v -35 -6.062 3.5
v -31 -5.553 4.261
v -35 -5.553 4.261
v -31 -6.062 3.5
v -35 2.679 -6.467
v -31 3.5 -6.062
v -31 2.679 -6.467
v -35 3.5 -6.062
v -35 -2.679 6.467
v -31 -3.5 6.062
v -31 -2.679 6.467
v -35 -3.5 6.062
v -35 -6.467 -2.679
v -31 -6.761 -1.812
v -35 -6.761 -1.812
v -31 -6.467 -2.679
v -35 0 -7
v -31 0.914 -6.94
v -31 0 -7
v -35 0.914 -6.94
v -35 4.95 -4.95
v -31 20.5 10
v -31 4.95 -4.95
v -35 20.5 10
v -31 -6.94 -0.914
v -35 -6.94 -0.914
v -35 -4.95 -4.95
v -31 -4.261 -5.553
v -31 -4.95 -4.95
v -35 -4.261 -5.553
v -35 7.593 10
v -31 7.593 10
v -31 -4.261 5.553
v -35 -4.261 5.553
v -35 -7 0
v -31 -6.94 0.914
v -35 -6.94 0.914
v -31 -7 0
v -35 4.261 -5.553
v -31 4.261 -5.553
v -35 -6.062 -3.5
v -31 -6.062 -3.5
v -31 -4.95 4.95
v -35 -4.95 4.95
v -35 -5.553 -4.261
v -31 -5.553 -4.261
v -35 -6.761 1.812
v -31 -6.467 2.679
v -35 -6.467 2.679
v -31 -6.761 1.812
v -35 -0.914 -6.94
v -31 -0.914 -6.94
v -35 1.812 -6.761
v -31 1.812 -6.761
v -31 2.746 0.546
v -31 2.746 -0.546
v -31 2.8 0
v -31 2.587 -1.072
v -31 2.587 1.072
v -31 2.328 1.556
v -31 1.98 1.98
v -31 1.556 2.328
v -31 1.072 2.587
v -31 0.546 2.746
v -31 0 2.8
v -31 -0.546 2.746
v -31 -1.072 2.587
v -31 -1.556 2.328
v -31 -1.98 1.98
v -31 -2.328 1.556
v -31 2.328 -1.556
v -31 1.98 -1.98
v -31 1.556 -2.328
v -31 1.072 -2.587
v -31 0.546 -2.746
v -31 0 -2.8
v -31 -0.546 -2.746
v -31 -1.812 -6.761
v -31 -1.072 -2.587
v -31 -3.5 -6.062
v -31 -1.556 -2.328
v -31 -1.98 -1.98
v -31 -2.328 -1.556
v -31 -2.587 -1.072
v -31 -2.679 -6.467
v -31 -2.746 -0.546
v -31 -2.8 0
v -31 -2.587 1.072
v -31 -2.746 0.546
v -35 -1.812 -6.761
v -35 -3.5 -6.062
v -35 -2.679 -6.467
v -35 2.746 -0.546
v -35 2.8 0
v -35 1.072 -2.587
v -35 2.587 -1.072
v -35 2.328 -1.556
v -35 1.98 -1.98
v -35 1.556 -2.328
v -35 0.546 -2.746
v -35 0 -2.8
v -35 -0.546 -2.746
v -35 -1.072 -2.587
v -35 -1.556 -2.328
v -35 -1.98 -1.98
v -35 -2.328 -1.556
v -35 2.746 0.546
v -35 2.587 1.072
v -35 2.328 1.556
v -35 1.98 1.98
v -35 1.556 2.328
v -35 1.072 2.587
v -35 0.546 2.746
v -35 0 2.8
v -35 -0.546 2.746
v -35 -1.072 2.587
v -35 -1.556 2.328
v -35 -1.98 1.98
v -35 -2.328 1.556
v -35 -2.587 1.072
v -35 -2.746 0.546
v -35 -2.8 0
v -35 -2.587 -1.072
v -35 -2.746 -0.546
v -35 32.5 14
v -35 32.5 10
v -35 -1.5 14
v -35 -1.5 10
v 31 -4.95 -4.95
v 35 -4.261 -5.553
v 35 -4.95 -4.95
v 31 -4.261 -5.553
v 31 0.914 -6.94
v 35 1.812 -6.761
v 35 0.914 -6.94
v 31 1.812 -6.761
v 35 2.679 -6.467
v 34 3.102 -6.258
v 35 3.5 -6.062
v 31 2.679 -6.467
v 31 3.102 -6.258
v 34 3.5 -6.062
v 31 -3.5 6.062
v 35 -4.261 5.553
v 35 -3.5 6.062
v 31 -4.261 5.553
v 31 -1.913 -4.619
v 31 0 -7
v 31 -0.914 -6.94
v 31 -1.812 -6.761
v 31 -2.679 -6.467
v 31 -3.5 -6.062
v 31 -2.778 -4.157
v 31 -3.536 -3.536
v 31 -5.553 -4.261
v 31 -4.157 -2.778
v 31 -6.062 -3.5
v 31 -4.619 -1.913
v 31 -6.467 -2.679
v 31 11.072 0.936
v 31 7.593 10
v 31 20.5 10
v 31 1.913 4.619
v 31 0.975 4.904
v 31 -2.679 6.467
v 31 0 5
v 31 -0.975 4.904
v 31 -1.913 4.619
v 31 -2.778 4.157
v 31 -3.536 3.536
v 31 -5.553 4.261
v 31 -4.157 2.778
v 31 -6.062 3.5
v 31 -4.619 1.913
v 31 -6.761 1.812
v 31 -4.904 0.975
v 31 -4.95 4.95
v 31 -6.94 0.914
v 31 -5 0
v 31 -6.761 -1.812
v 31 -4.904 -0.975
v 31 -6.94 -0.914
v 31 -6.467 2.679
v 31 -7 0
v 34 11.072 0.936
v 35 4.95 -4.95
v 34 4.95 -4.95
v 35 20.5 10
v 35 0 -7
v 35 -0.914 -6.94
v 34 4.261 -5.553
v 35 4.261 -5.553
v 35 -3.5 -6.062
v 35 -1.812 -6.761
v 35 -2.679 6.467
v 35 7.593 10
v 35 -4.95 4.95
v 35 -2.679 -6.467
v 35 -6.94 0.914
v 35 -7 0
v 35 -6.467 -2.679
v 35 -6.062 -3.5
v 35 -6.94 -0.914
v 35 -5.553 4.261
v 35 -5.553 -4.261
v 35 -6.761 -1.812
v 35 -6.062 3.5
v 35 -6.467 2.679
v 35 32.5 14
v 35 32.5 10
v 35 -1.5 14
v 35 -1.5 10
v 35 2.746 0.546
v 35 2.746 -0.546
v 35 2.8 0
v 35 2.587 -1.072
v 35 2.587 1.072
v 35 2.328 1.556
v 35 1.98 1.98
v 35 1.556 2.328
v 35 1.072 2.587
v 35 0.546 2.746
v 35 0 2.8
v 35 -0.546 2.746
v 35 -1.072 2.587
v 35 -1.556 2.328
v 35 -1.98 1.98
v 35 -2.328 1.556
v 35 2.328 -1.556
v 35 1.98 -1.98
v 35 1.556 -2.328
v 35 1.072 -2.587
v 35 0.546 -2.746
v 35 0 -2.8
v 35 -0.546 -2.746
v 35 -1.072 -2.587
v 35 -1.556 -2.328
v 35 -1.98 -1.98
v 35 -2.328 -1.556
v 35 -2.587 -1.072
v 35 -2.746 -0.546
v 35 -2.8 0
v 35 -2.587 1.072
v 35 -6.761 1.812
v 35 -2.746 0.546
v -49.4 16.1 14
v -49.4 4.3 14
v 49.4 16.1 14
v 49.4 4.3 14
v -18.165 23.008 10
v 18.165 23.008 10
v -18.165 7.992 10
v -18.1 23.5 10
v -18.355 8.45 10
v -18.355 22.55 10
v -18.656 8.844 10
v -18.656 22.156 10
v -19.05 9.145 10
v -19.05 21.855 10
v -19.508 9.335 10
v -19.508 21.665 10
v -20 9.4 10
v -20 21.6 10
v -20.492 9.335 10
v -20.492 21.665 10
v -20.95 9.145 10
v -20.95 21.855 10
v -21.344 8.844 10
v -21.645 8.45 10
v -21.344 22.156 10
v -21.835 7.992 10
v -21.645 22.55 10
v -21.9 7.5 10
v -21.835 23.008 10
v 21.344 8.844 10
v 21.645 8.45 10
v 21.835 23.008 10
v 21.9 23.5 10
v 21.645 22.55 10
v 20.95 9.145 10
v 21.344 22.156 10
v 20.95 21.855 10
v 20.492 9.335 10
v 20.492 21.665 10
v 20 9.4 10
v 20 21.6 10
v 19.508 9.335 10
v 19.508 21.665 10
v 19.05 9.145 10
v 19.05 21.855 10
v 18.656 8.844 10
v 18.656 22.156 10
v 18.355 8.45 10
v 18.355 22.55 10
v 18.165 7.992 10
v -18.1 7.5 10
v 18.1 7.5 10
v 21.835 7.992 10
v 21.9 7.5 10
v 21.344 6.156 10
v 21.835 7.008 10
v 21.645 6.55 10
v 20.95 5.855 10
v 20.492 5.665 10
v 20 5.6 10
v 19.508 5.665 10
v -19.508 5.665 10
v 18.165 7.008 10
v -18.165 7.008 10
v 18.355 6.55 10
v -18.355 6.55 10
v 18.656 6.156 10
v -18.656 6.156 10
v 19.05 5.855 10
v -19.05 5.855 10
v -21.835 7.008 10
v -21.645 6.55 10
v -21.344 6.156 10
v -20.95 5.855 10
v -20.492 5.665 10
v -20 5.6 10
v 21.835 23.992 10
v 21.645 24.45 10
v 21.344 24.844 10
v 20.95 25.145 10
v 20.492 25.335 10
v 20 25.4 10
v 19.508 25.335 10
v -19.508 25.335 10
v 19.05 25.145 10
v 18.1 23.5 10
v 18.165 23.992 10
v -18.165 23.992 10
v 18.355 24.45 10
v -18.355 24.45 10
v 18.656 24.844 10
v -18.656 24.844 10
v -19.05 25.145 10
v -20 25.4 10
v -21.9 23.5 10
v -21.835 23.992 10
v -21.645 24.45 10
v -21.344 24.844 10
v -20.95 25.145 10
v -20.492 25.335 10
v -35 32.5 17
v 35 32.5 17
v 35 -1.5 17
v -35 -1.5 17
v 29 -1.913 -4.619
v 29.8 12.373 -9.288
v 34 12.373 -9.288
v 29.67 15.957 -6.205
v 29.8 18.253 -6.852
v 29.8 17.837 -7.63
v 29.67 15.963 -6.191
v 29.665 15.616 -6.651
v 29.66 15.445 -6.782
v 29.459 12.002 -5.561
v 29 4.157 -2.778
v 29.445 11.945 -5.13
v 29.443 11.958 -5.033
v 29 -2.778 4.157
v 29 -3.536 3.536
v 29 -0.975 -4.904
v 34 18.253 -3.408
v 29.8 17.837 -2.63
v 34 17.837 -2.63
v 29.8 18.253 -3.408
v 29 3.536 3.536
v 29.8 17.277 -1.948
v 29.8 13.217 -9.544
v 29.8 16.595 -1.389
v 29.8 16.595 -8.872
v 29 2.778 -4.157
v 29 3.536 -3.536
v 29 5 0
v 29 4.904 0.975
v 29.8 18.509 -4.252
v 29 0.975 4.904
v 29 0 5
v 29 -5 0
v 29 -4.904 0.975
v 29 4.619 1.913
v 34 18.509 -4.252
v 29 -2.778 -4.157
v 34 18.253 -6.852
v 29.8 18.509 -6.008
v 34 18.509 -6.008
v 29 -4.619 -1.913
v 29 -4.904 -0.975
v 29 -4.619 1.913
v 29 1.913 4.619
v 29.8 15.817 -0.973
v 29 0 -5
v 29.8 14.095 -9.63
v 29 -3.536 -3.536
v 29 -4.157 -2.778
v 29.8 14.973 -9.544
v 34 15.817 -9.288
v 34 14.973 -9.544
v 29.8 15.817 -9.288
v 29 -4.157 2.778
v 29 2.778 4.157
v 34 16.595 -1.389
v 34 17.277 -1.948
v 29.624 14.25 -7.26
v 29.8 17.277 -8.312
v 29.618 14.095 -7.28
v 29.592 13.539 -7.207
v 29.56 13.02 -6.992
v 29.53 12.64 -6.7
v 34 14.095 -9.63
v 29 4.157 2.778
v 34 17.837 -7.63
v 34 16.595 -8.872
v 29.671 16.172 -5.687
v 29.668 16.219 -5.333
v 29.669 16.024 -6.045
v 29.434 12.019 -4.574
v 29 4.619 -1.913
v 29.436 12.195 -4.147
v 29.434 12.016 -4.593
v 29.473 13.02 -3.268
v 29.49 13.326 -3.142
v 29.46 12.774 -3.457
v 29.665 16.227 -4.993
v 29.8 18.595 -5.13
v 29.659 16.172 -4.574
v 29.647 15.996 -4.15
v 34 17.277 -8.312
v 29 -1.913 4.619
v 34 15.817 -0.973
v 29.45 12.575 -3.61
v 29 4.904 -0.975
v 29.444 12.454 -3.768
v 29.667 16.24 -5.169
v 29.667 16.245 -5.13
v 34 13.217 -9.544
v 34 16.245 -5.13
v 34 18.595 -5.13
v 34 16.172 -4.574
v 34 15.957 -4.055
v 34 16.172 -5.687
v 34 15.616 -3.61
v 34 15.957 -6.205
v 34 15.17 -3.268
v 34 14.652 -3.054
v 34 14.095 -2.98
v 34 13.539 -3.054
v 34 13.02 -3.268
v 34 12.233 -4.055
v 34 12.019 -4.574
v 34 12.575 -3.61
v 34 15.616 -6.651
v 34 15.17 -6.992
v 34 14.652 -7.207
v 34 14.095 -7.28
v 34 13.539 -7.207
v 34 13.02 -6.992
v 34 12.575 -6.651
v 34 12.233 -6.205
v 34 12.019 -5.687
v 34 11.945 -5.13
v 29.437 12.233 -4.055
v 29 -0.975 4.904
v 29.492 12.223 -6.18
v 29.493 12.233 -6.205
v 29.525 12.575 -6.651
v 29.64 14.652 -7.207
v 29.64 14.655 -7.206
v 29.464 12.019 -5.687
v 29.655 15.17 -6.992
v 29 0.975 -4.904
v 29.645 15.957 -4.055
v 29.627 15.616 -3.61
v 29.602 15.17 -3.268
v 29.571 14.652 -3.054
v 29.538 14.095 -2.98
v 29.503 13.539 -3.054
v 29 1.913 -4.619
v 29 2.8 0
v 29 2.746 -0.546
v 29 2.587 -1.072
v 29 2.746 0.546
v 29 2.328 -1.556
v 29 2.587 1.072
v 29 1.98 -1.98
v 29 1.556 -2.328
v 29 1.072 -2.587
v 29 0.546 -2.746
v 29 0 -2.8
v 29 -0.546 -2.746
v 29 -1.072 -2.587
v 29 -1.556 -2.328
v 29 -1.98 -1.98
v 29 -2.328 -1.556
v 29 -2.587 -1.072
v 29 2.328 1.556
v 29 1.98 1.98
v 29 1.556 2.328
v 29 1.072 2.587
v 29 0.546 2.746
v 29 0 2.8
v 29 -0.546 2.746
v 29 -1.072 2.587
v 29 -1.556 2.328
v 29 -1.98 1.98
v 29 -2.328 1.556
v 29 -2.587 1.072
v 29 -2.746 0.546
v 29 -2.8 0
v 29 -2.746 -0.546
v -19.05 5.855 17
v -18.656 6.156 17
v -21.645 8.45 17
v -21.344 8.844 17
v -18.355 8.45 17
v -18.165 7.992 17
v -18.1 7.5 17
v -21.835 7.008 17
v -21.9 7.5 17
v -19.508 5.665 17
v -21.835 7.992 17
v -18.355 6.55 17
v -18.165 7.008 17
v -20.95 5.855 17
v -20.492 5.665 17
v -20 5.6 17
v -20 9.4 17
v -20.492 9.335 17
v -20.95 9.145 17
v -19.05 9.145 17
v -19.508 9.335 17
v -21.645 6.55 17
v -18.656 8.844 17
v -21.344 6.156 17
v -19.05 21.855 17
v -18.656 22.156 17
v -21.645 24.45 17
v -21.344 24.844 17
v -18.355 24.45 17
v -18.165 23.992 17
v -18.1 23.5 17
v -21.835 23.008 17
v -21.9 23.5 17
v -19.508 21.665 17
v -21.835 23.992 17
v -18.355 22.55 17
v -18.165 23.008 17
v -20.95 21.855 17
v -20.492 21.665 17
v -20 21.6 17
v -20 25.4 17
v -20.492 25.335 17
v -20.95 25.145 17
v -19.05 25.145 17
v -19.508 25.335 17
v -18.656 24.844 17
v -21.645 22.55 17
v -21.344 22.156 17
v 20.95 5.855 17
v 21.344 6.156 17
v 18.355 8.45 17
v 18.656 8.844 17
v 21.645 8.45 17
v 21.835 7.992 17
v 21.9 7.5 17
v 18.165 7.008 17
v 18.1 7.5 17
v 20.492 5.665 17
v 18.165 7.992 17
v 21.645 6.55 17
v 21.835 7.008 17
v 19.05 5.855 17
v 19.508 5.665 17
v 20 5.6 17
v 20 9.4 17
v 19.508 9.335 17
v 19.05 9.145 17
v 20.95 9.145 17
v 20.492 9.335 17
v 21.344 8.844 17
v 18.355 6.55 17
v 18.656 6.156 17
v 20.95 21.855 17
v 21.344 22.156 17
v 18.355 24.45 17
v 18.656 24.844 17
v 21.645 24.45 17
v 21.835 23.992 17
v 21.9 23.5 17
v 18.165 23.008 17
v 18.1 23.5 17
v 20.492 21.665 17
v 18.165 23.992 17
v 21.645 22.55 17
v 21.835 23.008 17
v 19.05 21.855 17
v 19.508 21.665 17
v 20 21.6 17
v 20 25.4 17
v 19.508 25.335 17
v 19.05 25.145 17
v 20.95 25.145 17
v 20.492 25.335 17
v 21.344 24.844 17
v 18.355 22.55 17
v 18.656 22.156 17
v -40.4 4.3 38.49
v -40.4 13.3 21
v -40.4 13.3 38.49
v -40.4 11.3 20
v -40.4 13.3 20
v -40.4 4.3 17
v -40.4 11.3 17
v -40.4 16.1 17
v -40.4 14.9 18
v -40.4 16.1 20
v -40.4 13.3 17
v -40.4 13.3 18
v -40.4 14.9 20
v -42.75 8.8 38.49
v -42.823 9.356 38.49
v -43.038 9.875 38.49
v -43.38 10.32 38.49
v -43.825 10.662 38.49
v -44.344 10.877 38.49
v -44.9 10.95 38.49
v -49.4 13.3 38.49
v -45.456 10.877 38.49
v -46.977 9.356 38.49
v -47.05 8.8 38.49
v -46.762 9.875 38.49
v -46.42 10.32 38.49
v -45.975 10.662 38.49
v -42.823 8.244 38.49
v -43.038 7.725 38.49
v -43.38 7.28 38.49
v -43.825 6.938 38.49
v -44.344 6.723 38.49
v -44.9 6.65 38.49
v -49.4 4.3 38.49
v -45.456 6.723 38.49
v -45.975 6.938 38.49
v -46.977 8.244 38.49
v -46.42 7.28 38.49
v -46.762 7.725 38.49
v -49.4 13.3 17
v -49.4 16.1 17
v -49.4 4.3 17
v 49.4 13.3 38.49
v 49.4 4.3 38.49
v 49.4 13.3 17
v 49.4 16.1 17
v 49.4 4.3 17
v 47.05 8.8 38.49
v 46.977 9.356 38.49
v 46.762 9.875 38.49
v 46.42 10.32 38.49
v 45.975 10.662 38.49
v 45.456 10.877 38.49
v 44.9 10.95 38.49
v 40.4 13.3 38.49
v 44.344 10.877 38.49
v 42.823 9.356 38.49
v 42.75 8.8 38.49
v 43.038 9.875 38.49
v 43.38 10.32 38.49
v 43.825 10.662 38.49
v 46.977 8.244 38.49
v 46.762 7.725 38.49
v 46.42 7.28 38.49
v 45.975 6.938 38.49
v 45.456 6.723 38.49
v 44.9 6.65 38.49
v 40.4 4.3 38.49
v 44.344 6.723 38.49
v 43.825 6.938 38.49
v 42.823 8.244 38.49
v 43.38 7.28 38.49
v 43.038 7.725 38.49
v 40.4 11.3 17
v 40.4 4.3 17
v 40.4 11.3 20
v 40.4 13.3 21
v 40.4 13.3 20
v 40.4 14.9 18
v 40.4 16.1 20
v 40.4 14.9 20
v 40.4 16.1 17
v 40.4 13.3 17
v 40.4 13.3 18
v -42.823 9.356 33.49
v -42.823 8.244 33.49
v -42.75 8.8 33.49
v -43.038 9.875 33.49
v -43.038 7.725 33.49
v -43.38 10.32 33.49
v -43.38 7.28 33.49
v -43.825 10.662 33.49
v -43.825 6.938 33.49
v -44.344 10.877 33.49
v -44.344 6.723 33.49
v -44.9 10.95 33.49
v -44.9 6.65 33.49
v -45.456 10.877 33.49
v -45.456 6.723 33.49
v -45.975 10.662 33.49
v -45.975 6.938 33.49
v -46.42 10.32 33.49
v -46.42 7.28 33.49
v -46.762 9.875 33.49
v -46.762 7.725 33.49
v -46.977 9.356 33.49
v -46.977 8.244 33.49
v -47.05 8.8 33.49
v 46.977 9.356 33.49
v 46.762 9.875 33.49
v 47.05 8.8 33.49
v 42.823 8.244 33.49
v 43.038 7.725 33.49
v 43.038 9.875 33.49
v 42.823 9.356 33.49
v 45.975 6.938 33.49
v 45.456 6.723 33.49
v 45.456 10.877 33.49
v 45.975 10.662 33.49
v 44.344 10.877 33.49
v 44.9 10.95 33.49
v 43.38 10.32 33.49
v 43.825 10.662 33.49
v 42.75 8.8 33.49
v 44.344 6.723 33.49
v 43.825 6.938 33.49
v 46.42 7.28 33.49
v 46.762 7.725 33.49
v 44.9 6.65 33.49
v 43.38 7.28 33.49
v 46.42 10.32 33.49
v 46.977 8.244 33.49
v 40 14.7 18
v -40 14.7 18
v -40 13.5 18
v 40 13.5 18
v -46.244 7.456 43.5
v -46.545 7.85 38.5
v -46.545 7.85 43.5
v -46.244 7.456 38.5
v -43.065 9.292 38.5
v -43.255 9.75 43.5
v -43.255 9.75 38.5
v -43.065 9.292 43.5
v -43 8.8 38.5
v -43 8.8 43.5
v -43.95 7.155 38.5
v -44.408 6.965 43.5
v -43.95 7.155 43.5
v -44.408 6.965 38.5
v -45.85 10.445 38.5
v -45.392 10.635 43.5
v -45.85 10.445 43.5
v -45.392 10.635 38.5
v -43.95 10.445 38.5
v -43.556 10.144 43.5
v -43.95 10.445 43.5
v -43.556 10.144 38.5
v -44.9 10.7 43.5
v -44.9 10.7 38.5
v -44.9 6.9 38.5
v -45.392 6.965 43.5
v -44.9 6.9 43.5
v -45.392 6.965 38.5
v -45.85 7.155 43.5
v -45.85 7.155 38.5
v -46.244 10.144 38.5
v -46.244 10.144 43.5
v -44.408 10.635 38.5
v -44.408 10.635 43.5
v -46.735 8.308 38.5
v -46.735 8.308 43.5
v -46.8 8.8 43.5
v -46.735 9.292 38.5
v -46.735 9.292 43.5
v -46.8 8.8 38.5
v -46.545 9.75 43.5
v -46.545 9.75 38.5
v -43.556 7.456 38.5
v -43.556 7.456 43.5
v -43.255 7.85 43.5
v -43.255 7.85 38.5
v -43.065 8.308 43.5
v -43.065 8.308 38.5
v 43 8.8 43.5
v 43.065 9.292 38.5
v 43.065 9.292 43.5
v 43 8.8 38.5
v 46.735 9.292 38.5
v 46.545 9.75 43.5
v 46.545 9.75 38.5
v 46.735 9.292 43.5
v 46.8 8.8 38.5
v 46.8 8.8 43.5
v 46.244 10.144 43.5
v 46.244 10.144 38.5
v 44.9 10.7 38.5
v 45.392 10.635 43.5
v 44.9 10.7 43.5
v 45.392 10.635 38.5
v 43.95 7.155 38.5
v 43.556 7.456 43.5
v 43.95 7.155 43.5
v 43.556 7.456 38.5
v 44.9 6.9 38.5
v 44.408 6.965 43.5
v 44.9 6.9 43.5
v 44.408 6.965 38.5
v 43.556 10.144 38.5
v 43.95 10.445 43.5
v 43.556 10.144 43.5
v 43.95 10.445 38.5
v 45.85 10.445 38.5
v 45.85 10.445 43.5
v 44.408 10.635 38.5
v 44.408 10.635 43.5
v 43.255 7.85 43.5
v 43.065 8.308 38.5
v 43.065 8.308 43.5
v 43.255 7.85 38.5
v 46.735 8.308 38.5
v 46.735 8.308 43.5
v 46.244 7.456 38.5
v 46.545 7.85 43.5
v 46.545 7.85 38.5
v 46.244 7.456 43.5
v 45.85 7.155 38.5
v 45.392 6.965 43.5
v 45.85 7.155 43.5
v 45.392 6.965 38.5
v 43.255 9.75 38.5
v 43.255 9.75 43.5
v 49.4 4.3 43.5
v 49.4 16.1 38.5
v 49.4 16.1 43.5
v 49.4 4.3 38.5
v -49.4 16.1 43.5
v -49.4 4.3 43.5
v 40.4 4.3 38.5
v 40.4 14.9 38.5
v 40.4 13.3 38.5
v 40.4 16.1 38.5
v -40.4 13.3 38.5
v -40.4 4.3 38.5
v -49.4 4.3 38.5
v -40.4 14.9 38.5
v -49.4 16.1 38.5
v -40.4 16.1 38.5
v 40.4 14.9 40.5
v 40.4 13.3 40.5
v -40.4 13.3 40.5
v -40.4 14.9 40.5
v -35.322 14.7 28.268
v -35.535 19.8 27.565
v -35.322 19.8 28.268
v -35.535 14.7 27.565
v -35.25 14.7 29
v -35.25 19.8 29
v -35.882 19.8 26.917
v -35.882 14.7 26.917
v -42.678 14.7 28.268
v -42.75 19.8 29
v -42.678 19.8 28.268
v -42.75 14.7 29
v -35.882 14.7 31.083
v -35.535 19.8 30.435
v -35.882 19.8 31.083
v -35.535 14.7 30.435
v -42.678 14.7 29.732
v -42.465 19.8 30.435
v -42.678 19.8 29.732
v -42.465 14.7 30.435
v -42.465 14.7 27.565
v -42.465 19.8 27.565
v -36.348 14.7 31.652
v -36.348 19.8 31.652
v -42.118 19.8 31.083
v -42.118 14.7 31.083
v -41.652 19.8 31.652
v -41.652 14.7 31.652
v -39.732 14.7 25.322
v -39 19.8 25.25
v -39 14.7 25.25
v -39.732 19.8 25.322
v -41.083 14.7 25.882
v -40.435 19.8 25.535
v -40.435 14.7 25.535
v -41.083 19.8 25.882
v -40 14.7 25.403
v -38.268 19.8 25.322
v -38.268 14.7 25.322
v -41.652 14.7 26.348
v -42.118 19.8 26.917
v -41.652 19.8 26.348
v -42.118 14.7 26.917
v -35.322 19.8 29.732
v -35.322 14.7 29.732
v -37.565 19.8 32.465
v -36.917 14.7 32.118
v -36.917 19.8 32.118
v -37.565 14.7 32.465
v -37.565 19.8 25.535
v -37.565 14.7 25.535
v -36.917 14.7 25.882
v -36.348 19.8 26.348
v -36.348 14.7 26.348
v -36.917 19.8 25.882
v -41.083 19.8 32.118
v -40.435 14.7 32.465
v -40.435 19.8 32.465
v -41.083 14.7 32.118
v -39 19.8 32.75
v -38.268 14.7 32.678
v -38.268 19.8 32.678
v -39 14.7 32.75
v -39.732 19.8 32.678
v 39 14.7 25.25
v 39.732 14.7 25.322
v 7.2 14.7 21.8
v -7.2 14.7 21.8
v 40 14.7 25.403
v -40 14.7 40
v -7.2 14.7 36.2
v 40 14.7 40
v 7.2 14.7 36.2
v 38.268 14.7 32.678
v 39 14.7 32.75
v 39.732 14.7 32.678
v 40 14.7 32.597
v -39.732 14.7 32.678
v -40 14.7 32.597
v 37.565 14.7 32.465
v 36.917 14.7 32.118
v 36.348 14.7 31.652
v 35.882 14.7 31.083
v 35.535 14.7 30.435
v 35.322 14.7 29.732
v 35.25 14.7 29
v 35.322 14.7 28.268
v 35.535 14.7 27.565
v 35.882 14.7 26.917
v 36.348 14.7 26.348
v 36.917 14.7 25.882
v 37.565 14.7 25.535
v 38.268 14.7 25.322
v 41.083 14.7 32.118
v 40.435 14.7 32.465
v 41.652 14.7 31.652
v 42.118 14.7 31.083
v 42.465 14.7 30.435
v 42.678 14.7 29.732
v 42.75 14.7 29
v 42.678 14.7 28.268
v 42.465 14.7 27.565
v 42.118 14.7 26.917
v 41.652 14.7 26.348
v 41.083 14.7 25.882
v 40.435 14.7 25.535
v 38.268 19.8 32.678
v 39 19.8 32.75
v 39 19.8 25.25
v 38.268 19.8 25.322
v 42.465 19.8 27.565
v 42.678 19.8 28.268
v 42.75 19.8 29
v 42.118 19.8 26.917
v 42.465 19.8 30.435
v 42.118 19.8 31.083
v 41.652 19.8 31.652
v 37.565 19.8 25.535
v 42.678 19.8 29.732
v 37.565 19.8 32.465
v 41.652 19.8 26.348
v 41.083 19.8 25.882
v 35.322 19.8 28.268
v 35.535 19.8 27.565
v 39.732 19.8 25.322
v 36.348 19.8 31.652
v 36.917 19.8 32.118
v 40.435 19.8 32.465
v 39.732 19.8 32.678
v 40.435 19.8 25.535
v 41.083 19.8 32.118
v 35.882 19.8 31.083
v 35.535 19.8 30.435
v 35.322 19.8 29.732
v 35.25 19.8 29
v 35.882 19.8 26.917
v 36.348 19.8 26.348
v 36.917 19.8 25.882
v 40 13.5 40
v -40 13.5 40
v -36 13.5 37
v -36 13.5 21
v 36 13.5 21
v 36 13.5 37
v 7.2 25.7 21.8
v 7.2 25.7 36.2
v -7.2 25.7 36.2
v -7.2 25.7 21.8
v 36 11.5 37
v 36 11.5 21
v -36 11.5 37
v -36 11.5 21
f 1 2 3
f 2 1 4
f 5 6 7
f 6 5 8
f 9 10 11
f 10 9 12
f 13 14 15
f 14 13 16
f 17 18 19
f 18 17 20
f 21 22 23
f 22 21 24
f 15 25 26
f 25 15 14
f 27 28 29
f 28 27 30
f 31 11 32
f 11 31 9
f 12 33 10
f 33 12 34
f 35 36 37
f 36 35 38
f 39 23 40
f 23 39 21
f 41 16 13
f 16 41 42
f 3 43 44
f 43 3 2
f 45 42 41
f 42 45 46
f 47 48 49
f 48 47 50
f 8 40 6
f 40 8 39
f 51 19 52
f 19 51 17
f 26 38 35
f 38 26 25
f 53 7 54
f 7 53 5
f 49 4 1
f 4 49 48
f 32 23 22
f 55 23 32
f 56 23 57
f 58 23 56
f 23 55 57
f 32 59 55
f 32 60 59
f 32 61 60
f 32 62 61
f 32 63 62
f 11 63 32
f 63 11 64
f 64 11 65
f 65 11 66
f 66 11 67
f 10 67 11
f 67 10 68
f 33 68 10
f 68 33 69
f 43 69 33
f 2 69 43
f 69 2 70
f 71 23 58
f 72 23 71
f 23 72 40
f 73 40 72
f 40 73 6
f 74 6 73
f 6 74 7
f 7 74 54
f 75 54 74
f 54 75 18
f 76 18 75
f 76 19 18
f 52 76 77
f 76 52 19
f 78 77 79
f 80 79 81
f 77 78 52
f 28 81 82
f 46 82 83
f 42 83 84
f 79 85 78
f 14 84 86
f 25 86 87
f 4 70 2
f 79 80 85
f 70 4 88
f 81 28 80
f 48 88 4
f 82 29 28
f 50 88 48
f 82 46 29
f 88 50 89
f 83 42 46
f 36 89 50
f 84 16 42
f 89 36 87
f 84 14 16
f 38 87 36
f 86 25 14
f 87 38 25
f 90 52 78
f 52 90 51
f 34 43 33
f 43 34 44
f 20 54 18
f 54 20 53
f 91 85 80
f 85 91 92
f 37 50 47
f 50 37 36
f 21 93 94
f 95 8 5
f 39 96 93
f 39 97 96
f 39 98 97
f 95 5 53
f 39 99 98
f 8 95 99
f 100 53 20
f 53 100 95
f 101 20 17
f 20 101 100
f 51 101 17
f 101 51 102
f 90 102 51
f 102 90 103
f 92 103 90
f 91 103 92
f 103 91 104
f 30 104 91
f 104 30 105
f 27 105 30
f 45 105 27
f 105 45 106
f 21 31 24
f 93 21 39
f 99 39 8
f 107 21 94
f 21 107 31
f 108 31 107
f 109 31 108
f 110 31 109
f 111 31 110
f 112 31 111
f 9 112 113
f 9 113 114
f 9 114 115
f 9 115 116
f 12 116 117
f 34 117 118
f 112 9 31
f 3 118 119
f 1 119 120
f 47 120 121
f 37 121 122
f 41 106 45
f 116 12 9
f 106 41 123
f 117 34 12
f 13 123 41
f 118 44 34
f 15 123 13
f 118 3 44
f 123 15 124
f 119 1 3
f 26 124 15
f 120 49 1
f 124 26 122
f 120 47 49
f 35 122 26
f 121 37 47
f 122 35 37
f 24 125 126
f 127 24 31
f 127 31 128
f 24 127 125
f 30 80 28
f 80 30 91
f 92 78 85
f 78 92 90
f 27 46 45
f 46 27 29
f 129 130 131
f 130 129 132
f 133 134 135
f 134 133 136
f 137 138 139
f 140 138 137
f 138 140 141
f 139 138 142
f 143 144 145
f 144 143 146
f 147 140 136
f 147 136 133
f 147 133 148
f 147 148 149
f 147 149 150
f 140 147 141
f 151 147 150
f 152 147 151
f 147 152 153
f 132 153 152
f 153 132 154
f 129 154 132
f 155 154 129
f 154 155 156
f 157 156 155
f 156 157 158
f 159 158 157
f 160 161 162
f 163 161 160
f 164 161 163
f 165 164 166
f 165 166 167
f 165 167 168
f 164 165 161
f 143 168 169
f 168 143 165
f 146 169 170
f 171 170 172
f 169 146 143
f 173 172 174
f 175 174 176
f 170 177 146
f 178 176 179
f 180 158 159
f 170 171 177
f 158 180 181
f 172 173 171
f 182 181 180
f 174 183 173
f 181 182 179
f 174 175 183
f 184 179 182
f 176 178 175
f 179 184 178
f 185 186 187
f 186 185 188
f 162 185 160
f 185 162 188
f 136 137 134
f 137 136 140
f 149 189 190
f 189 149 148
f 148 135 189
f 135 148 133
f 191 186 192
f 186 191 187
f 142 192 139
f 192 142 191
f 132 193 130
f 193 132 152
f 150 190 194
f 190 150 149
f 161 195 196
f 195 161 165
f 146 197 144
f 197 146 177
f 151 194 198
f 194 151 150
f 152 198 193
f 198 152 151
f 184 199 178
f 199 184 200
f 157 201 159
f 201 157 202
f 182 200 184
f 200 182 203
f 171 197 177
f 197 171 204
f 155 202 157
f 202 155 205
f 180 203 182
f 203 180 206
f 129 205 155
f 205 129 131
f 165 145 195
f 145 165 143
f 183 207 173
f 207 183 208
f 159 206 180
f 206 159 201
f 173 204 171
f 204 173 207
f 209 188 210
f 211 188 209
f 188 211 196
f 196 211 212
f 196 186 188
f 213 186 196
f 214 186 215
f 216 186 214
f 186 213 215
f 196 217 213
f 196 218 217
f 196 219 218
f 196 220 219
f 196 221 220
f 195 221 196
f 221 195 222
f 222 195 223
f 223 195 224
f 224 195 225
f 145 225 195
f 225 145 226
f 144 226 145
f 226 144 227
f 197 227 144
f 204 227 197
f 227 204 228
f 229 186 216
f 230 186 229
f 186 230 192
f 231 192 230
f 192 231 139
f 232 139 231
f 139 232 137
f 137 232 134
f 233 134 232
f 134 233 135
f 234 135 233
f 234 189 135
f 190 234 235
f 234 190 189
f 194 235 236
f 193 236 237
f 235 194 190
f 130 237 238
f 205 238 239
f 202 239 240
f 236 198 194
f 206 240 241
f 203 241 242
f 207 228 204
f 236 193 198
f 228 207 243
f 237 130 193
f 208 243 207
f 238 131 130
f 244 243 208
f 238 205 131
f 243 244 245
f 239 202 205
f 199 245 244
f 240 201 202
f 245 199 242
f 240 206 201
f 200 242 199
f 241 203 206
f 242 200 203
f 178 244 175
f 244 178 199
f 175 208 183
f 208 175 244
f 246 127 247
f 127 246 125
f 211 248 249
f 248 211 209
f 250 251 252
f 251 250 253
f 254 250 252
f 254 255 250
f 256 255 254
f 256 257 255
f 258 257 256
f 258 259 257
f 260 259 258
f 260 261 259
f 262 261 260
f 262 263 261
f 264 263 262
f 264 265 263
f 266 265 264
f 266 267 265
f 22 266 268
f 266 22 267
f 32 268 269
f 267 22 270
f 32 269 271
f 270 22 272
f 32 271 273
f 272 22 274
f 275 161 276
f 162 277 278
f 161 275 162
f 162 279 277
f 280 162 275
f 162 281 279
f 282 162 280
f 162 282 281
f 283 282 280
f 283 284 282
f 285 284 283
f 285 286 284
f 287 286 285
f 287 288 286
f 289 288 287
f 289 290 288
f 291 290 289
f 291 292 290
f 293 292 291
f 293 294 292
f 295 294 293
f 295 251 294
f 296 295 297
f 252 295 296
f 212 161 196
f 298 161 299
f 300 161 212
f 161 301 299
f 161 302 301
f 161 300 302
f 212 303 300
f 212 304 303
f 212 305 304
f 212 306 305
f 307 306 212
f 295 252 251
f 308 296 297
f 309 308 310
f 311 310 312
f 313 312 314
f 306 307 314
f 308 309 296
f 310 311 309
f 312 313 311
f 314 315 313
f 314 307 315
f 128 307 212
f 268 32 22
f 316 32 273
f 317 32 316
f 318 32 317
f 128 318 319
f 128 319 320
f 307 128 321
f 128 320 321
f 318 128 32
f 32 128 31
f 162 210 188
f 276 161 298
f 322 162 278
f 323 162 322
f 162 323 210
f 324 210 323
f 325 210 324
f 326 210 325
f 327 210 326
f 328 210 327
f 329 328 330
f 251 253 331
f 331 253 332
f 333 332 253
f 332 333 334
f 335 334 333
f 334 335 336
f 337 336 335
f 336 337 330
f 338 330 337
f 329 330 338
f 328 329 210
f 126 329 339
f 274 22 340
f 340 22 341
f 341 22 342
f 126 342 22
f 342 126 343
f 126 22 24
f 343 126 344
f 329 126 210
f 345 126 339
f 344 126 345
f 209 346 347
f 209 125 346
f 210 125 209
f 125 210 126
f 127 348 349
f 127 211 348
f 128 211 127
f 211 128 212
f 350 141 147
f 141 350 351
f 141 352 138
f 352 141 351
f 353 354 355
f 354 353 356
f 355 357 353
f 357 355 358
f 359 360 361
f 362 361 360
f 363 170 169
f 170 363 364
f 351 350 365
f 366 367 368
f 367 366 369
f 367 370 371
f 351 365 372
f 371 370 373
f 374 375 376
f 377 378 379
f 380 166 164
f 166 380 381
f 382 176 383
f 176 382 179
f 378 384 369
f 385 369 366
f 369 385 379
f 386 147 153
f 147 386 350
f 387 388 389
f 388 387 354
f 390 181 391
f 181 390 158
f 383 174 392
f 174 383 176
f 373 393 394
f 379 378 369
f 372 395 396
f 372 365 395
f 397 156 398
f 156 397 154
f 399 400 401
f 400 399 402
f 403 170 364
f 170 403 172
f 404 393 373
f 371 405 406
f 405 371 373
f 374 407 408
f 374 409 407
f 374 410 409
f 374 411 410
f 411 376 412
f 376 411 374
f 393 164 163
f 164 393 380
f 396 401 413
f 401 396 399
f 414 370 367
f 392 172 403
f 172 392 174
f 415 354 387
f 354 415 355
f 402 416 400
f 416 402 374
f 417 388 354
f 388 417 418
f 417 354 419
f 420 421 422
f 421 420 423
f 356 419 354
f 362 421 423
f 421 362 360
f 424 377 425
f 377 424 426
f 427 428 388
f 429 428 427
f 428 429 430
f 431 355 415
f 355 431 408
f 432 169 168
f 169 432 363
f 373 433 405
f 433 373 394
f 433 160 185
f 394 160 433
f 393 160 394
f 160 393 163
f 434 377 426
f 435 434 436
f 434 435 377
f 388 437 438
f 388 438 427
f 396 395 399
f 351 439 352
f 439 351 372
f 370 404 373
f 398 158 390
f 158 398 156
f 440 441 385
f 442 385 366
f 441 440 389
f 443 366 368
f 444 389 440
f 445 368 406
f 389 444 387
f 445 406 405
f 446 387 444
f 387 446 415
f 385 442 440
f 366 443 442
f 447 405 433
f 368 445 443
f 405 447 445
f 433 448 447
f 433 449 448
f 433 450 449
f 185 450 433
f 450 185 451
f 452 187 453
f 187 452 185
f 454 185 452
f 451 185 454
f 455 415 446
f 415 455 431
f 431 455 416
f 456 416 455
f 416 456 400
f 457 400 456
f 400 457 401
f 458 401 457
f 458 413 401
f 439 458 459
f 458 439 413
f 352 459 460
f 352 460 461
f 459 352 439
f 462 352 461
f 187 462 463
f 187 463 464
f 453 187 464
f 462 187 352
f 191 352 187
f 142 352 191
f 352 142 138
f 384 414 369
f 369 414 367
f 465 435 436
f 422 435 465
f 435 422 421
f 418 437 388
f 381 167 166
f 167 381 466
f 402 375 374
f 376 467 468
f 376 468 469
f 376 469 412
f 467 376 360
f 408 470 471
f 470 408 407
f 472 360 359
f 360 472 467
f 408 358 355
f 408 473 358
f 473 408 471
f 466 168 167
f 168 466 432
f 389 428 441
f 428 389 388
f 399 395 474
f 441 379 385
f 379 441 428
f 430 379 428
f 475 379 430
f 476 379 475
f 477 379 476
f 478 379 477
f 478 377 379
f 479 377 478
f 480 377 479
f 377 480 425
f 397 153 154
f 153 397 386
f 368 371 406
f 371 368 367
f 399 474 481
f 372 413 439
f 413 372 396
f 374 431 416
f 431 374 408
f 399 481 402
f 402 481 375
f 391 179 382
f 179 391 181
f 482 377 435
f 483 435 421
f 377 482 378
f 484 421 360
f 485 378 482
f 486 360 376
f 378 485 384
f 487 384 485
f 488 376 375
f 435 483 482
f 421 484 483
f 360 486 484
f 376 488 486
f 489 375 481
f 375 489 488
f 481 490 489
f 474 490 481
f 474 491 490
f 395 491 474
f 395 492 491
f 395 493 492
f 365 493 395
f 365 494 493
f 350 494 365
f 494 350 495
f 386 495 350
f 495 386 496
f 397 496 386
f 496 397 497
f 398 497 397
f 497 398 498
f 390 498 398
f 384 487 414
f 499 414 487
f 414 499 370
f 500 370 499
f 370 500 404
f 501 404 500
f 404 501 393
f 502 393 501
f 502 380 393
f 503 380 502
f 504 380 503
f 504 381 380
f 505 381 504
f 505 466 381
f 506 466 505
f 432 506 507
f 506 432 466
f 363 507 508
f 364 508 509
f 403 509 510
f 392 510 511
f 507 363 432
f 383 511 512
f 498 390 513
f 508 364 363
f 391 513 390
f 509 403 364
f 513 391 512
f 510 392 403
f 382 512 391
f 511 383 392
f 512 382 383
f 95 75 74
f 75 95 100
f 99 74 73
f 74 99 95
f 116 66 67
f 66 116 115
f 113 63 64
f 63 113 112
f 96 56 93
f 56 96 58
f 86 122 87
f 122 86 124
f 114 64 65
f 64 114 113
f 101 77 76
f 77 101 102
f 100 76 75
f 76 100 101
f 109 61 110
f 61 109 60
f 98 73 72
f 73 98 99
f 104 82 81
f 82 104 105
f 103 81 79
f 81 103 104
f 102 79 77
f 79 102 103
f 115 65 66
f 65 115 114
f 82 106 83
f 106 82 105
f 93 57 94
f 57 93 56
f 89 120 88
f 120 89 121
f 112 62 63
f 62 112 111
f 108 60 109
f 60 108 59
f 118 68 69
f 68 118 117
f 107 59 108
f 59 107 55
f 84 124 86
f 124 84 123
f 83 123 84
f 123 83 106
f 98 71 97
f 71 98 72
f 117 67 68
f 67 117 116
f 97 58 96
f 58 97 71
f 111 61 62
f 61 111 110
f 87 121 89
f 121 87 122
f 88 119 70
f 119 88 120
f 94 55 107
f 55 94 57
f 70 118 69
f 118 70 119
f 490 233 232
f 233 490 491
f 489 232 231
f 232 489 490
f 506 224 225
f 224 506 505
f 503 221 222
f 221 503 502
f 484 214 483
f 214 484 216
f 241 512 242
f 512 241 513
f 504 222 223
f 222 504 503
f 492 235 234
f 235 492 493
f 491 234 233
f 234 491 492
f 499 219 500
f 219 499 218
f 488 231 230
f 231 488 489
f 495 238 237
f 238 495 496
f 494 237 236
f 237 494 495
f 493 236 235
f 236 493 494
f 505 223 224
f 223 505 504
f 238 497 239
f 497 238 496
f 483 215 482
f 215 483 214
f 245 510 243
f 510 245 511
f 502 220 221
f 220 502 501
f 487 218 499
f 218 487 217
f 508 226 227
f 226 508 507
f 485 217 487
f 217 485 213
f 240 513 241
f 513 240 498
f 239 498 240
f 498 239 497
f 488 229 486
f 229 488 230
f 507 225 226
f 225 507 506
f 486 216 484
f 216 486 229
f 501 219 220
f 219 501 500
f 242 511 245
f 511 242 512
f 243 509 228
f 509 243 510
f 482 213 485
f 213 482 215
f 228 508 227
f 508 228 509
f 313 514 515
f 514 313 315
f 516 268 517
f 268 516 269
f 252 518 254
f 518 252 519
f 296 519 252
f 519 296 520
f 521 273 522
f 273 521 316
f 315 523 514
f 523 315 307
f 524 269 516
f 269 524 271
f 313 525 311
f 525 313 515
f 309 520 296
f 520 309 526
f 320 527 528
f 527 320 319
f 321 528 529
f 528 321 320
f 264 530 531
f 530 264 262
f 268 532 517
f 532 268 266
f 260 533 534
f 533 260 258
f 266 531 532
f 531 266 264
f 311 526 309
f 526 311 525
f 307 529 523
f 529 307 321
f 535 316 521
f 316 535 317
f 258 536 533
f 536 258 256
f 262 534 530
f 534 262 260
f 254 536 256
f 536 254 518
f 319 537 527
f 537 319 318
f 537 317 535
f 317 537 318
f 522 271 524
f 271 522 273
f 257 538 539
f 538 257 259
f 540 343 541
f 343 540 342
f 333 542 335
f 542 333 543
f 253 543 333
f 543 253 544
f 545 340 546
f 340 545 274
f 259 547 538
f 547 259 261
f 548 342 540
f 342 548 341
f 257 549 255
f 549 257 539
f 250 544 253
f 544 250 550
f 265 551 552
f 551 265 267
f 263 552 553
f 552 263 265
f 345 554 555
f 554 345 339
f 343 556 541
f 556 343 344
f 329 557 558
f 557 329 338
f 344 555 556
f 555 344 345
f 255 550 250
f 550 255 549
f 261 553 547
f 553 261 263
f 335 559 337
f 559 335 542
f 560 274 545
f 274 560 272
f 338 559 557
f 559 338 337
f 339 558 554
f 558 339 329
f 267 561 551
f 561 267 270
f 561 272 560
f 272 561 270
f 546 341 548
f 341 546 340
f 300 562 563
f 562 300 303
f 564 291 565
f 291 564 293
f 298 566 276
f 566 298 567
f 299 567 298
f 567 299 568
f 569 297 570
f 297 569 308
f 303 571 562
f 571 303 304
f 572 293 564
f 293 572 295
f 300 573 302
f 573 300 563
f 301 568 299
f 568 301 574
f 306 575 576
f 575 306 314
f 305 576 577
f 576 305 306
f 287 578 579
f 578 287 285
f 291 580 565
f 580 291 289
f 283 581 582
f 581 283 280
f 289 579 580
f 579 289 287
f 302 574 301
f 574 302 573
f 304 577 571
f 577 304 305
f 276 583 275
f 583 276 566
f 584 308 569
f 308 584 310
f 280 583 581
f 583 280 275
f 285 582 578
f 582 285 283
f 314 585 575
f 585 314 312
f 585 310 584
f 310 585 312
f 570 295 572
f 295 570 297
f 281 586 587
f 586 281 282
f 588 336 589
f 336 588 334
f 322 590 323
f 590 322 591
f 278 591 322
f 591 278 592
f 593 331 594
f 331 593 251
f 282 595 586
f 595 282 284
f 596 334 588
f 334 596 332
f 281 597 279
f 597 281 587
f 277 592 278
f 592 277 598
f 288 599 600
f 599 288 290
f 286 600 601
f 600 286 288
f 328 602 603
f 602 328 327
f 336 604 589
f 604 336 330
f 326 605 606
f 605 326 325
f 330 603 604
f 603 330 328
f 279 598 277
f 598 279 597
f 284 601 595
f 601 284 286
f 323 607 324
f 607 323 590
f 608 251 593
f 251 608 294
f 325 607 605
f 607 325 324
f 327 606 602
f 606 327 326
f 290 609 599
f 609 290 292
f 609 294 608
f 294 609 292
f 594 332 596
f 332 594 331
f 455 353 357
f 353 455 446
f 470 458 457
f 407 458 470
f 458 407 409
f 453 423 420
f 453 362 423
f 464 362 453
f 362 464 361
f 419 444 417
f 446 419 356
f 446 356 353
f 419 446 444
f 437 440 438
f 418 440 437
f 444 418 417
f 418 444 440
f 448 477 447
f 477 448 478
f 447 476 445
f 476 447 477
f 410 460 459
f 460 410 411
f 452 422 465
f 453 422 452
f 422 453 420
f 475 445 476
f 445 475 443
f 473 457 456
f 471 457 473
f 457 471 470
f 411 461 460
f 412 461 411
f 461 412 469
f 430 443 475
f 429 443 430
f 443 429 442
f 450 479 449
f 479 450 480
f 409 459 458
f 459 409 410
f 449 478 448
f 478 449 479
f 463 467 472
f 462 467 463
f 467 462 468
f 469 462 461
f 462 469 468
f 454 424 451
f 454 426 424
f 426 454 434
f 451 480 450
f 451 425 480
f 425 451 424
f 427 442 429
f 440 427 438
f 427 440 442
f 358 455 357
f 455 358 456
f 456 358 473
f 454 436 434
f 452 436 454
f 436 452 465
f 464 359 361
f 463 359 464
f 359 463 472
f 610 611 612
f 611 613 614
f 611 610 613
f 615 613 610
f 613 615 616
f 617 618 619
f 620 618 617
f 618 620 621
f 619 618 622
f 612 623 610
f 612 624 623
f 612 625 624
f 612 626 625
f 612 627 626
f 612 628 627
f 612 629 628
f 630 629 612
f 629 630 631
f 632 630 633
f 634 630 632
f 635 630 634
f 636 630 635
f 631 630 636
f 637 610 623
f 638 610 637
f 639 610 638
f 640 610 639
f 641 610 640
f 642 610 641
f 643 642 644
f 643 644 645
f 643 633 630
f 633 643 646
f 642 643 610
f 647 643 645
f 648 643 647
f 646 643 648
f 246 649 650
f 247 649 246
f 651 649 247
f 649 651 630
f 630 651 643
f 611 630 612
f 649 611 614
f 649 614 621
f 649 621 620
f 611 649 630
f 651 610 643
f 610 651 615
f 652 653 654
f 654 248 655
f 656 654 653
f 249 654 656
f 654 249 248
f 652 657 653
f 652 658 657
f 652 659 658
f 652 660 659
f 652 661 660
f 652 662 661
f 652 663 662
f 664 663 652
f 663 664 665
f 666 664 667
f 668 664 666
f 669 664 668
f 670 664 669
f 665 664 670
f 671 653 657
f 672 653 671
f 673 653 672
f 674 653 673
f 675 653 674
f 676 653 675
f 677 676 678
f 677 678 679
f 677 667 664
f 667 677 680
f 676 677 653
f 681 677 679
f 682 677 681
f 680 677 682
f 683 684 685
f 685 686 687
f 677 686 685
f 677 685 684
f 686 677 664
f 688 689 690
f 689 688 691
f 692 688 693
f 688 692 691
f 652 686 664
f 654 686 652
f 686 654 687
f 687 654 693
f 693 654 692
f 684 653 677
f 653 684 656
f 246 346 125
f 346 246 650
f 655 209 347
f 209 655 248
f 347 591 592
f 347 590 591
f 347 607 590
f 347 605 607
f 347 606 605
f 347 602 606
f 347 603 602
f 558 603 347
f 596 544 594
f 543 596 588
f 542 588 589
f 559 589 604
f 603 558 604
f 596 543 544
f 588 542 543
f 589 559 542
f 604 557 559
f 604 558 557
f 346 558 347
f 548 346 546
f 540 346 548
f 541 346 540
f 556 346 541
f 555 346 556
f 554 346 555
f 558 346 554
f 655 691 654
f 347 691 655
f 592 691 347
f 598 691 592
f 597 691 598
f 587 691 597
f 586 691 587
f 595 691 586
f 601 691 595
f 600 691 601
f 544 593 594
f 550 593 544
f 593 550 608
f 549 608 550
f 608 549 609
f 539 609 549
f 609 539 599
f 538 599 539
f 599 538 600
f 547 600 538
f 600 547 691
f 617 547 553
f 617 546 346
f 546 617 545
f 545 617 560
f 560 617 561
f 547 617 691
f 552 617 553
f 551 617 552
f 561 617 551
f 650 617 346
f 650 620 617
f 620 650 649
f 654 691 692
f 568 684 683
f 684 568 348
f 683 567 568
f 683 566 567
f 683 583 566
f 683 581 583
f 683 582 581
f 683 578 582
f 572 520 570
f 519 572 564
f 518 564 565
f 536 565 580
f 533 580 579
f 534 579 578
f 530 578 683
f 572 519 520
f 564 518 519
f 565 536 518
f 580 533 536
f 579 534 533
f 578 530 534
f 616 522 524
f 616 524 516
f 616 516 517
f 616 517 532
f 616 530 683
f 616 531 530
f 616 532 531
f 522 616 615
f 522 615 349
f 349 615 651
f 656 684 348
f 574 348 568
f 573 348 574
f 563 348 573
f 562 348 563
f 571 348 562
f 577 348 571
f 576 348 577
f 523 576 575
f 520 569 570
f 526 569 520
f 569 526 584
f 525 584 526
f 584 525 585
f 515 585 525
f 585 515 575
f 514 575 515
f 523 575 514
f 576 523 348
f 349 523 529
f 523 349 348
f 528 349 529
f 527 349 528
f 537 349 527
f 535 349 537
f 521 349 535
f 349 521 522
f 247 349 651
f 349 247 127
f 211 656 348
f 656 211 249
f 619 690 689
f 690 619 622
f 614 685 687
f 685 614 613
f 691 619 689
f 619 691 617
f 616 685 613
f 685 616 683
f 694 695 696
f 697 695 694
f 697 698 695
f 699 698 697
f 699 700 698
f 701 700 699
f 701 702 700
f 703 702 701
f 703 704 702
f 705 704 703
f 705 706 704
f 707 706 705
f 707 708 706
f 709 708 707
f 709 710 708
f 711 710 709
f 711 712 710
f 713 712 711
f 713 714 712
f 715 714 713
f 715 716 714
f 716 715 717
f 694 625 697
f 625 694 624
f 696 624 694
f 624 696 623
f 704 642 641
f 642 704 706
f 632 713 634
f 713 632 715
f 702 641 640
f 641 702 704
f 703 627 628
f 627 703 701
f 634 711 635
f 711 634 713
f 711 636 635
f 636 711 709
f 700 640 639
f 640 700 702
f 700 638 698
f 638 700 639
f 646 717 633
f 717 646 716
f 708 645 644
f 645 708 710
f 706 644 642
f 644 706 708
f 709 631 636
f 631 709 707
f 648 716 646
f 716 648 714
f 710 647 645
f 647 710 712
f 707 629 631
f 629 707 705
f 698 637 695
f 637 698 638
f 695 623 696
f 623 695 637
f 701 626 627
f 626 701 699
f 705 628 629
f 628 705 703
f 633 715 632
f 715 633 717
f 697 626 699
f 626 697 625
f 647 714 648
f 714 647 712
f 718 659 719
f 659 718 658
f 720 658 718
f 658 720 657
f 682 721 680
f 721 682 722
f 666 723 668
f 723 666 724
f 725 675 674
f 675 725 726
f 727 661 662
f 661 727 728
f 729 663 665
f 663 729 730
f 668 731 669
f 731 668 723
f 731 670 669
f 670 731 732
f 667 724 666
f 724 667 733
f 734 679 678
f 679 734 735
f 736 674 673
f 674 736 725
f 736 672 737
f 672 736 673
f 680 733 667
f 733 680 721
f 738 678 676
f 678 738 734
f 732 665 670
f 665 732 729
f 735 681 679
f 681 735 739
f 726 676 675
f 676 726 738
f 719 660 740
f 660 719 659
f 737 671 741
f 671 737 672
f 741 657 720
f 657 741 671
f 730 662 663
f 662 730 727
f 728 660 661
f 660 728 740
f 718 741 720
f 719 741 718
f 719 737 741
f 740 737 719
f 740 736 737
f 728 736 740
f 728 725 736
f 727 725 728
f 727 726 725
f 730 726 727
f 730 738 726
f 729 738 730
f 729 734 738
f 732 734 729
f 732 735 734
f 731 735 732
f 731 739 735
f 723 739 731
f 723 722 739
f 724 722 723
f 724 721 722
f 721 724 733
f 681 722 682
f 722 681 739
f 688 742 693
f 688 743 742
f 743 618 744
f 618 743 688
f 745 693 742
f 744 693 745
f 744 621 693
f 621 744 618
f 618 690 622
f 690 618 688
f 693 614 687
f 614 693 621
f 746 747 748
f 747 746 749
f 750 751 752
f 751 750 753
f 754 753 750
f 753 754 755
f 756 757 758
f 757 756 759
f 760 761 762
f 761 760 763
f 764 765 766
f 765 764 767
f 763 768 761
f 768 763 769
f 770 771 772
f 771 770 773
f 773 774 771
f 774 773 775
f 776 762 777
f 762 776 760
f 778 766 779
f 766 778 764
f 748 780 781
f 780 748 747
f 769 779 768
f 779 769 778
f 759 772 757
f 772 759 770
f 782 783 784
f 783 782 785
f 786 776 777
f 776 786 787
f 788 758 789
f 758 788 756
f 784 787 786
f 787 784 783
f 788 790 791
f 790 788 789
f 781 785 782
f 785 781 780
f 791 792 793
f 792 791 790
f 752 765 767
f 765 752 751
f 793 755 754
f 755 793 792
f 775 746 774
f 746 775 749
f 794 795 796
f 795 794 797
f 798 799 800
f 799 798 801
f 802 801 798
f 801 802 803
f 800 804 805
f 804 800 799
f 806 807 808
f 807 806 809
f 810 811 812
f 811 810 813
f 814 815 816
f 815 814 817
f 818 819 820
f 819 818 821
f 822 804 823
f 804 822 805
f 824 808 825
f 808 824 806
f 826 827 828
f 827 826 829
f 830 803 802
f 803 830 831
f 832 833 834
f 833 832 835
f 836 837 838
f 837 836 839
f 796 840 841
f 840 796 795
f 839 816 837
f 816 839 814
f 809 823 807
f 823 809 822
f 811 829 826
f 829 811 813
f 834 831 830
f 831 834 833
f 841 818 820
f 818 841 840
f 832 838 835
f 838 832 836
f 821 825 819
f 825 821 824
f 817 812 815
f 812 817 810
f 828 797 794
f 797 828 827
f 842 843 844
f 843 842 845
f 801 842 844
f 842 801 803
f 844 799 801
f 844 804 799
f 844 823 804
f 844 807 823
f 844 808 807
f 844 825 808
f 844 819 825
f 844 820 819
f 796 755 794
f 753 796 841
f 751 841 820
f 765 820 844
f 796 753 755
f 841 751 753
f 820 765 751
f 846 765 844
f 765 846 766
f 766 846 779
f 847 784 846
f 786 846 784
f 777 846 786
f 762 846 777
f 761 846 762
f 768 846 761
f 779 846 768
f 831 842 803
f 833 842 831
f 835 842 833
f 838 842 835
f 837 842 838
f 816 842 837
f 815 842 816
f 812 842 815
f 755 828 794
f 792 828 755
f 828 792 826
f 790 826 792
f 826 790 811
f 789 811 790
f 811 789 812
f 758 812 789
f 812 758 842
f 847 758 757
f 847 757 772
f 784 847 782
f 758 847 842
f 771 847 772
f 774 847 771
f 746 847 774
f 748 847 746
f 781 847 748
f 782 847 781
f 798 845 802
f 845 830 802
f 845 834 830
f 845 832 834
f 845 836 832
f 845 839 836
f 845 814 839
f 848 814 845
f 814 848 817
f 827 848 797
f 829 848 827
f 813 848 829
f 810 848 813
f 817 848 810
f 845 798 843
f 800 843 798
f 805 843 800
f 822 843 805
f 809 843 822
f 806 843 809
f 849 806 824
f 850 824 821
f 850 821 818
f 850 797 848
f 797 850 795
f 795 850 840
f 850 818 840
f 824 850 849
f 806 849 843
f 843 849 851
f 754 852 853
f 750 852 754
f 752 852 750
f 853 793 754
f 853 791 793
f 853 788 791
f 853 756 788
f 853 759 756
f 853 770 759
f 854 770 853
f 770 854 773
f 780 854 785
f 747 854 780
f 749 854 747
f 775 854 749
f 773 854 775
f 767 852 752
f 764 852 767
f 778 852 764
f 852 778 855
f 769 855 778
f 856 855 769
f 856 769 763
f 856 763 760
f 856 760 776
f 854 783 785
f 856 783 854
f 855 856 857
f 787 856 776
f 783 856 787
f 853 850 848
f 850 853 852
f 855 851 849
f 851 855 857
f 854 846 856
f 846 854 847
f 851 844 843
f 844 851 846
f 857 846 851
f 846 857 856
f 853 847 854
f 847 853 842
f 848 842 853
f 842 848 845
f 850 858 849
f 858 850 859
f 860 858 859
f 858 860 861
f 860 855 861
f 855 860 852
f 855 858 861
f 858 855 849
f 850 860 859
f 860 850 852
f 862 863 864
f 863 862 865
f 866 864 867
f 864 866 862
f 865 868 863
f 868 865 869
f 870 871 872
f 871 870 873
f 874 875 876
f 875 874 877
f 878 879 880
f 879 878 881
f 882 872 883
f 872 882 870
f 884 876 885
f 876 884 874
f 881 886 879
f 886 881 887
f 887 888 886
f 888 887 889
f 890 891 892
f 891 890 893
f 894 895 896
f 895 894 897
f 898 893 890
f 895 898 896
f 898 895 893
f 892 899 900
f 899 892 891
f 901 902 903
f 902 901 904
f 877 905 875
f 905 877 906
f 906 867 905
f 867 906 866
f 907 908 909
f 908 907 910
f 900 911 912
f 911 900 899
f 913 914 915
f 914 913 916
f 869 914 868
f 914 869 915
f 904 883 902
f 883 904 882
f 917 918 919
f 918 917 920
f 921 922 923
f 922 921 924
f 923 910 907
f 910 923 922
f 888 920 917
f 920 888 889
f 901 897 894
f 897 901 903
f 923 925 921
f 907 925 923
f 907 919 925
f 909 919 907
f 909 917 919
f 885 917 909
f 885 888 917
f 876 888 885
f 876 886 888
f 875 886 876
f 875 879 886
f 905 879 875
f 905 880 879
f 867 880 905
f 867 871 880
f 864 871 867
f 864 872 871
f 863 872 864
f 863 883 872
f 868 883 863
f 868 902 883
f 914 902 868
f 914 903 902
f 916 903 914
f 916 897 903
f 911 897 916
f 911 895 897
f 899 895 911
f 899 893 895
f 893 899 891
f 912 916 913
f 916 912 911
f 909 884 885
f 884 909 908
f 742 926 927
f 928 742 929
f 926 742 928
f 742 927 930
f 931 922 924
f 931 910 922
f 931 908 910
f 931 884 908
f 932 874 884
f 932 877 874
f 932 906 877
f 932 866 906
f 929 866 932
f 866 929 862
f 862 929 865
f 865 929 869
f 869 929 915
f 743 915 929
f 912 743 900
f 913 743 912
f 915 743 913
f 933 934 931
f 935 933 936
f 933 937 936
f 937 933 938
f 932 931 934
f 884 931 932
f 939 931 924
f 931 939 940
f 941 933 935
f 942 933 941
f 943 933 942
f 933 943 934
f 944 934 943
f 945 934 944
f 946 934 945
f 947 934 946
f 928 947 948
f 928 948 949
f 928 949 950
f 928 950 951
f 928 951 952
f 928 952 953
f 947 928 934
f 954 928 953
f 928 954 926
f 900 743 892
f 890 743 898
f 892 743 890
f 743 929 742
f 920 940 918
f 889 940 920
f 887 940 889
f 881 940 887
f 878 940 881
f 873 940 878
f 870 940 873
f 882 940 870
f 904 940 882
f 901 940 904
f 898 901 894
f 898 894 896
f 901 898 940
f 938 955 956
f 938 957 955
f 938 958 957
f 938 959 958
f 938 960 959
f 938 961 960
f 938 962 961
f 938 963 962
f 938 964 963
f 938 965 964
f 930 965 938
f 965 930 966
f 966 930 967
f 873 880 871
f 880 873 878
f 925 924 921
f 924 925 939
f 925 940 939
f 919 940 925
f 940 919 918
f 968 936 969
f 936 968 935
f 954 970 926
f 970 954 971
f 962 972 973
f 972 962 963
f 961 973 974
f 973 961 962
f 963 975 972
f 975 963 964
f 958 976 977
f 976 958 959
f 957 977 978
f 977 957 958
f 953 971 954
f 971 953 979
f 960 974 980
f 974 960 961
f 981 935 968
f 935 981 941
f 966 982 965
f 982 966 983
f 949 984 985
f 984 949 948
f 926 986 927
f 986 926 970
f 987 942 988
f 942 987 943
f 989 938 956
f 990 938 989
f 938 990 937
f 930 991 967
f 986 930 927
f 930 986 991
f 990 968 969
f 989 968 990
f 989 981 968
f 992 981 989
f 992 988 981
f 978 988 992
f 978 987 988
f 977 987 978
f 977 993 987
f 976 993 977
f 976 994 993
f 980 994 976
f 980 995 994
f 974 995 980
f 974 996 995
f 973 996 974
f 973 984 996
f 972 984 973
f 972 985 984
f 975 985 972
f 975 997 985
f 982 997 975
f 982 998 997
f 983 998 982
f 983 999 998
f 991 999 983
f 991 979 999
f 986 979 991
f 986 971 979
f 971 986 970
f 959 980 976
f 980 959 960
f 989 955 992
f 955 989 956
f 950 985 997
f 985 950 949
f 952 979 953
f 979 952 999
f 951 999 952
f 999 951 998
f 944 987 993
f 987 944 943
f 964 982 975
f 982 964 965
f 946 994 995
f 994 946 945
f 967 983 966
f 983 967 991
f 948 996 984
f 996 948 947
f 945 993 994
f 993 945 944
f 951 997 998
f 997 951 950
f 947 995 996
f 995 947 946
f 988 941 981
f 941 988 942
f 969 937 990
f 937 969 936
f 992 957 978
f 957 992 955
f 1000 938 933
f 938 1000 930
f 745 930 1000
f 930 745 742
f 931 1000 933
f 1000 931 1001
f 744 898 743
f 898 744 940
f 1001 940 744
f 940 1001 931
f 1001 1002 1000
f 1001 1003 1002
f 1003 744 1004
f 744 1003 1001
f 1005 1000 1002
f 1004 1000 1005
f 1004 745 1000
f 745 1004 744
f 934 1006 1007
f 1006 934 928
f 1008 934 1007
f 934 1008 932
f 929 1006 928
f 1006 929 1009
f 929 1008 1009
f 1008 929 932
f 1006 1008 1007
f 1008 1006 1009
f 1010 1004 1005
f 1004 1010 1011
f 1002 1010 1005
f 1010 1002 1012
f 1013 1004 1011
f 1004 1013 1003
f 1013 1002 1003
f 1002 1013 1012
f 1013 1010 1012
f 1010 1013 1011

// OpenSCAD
// C920 camera holder for the servo test stand's head: bolts onto the head's bridge plate (its 4 x M3 holes),
// so the head, its link and the servo calibration don't change.
//
//   The bare C920 board (80 x 22 x 1.2; lens block 14.4 square, 11 tall; microphones 5.1 tall at the ends;
//   parts up to 2 mm on the back, the cable soldered on the back) stands UPRIGHT, facing forward: the camera
//   looks along the bridge, so "bridge level" is still "looking straight ahead".
//   HOLDER  a base on the bridge (4 x M3 down through it, nuts underneath), a grooved rail for the board's
//           bottom edge, and two posts at the ends, behind the board (clear of the microphones)
//   RAIL    the top rail: a groove over the board's top edge, 2 x M3 down into inserts in the posts
//   The rails grip only the board's top and bottom edges (2 mm), open at the back for the cable.
//
// Frame: the head's (as head() in servo_test_stand.scad): axle along X at the origin, +Y forward, +Z up.
// part = "holder" | "rail" | "view"
include <servo_test_stand.scad>
part = "view";                       // (after the include: overrides the stand's own part)

// ---- the board (MEASURED 2026-10-21) --------------------------------------------------------------
c_b      = [80, 22, 1.2];           // length (X), height (Z), thickness (Y)
c_lens   = [14.4, 11];              // lens block: square side, height above the board's front
c_mic    = [7.5, 5.1];              // microphones: diameter, height (centred on the board's ends)
c_back   = 2;                       // tallest parts on the back

// ---- holder -----------------------------------------------------------------------------------------
c_fit    = 0.2;                     // groove clearance on each face of the board
c_slack  = 0.5;                     // extra height between the grooves (the board's height is approximate)
c_grip   = 2;                       // how far the grooves reach over the board's edges
c_lip    = 1.2;                     // groove front lip thickness
c_bwall  = 2;                       // groove back wall thickness
base_t   = 3;
post     = 9;                       // posts: square, at the board's ends, behind it (insert M3 from the top)
rail_t   = 3;                       // top rail: solid above the groove

z_base   = bridge_dz + bridge[2];   // the base sits on the bridge
yb       = head_dy - 2;             // the board's back face: lens block over the bridge, screws clear
yf       = yb + c_b[2];             // ... and front face
zg       = z_base + base_t + 1;     // groove floor = the board's bottom edge
z_top    = zg + c_b[1] + c_slack;   // top groove's ceiling
xr       = c_b[0] / 2 + 0.4;        // grooves' ends (the board's ends + clearance)
gy       = [yb - c_fit, yf + c_fit];                       // groove, Y
ry       = [gy[0] - c_bwall, gy[1] + c_lip];               // rails, Y
py       = [gy[0] - post, gy[0]];                          // posts, Y (behind the board)
px       = [xr, xr + post];                                // posts, X (each side)
z_post   = z_top - c_grip - 0.01;   // post tops: the top rail sits on them
brg_holes = [for (x = [-20, 20], y = [-8, 8]) [x, head_dy + y]];   // the bridge's camera holes

module c920() {                     // the board, for the view and the clash check
    color("#2e7d32") translate([-c_b[0] / 2, yb, zg]) cube([c_b[0], c_b[2], c_b[1]]);
    color("#111") translate([-c_lens[0] / 2, yf, zg + c_b[1] / 2 - c_lens[0] / 2]) cube([c_lens[0], c_lens[1], c_lens[0]]);
    color("#999") for (s = [-1, 1]) translate([s * (c_b[0] / 2 - 1), yf, zg + c_b[1] / 2]) rotate([-90, 0, 0])
        cylinder(d = c_mic[0], h = c_mic[1], $fn = 32);
    color("#666") translate([-c_b[0] / 2 + 4, yb - c_back, zg + 3]) cube([c_b[0] - 8, c_back, c_b[1] - 6]);
}

module holder() {
    difference() {
        union() {
            hull() {                                                                         // base
                box([-bridge[0] / 2, bridge[0] / 2], [head_dy - bridge[1] / 2, head_dy + bridge[1] / 2], [z_base, z_base + base_t]);
                box([-px[1], px[1]], [py[0], ry[1]], [z_base, z_base + base_t]);
            }
            box([-xr, xr], ry, [z_base, zg + c_grip]);                                       // bottom rail
            for (s = [-1, 1]) box(s > 0 ? px : [-px[1], -px[0]], py, [z_base, z_post]);     // posts
        }
        box([-xr, xr], gy, [zg, zg + c_grip + 1]);                                           // bottom groove
        for (h = brg_holes) translate([h[0], h[1], z_base - 1]) hole3(base_t + 2);           // 4 x M3 to the bridge
        for (s = [-1, 1]) translate([s * (px[0] + post / 2), (py[0] + py[1]) / 2, z_post - insert_m3[1]]) insert3();
    }
}

module top_rail() {
    difference() {
        box([-px[1], px[1]], [py[0], ry[1]], [z_post + 0.01, z_top + rail_t]);
        box([-xr, xr], gy, [z_post - 1, z_top]);                                             // top groove
        box([-xr, xr], [ry[1] - c_lip - 0.01, ry[1] + 1], [z_post - 1, z_top - c_grip]);     // (front lip: just c_grip deep)
        box([-xr, xr], [py[0] - 1, gy[0] + 0.01], [z_post - 1, z_top - c_grip]);             // (back: just c_grip deep)
        for (s = [-1, 1]) translate([s * (px[0] + post / 2), (py[0] + py[1]) / 2, z_post - 1]) hole3(z_top + rail_t - z_post + 2);
    }
}

if (part == "holder") translate([0, 0, -z_base]) holder();                                   // base on the bed
if (part == "rail")   translate([0, 0, z_top + rail_t]) rotate([180, 0, 0]) top_rail();      // top face on the bed
if (part == "view") {
    color("#6b8fb5") head();
    color("#c55") holder();
    color("#e8a33d") top_rail();
    c920();
}
